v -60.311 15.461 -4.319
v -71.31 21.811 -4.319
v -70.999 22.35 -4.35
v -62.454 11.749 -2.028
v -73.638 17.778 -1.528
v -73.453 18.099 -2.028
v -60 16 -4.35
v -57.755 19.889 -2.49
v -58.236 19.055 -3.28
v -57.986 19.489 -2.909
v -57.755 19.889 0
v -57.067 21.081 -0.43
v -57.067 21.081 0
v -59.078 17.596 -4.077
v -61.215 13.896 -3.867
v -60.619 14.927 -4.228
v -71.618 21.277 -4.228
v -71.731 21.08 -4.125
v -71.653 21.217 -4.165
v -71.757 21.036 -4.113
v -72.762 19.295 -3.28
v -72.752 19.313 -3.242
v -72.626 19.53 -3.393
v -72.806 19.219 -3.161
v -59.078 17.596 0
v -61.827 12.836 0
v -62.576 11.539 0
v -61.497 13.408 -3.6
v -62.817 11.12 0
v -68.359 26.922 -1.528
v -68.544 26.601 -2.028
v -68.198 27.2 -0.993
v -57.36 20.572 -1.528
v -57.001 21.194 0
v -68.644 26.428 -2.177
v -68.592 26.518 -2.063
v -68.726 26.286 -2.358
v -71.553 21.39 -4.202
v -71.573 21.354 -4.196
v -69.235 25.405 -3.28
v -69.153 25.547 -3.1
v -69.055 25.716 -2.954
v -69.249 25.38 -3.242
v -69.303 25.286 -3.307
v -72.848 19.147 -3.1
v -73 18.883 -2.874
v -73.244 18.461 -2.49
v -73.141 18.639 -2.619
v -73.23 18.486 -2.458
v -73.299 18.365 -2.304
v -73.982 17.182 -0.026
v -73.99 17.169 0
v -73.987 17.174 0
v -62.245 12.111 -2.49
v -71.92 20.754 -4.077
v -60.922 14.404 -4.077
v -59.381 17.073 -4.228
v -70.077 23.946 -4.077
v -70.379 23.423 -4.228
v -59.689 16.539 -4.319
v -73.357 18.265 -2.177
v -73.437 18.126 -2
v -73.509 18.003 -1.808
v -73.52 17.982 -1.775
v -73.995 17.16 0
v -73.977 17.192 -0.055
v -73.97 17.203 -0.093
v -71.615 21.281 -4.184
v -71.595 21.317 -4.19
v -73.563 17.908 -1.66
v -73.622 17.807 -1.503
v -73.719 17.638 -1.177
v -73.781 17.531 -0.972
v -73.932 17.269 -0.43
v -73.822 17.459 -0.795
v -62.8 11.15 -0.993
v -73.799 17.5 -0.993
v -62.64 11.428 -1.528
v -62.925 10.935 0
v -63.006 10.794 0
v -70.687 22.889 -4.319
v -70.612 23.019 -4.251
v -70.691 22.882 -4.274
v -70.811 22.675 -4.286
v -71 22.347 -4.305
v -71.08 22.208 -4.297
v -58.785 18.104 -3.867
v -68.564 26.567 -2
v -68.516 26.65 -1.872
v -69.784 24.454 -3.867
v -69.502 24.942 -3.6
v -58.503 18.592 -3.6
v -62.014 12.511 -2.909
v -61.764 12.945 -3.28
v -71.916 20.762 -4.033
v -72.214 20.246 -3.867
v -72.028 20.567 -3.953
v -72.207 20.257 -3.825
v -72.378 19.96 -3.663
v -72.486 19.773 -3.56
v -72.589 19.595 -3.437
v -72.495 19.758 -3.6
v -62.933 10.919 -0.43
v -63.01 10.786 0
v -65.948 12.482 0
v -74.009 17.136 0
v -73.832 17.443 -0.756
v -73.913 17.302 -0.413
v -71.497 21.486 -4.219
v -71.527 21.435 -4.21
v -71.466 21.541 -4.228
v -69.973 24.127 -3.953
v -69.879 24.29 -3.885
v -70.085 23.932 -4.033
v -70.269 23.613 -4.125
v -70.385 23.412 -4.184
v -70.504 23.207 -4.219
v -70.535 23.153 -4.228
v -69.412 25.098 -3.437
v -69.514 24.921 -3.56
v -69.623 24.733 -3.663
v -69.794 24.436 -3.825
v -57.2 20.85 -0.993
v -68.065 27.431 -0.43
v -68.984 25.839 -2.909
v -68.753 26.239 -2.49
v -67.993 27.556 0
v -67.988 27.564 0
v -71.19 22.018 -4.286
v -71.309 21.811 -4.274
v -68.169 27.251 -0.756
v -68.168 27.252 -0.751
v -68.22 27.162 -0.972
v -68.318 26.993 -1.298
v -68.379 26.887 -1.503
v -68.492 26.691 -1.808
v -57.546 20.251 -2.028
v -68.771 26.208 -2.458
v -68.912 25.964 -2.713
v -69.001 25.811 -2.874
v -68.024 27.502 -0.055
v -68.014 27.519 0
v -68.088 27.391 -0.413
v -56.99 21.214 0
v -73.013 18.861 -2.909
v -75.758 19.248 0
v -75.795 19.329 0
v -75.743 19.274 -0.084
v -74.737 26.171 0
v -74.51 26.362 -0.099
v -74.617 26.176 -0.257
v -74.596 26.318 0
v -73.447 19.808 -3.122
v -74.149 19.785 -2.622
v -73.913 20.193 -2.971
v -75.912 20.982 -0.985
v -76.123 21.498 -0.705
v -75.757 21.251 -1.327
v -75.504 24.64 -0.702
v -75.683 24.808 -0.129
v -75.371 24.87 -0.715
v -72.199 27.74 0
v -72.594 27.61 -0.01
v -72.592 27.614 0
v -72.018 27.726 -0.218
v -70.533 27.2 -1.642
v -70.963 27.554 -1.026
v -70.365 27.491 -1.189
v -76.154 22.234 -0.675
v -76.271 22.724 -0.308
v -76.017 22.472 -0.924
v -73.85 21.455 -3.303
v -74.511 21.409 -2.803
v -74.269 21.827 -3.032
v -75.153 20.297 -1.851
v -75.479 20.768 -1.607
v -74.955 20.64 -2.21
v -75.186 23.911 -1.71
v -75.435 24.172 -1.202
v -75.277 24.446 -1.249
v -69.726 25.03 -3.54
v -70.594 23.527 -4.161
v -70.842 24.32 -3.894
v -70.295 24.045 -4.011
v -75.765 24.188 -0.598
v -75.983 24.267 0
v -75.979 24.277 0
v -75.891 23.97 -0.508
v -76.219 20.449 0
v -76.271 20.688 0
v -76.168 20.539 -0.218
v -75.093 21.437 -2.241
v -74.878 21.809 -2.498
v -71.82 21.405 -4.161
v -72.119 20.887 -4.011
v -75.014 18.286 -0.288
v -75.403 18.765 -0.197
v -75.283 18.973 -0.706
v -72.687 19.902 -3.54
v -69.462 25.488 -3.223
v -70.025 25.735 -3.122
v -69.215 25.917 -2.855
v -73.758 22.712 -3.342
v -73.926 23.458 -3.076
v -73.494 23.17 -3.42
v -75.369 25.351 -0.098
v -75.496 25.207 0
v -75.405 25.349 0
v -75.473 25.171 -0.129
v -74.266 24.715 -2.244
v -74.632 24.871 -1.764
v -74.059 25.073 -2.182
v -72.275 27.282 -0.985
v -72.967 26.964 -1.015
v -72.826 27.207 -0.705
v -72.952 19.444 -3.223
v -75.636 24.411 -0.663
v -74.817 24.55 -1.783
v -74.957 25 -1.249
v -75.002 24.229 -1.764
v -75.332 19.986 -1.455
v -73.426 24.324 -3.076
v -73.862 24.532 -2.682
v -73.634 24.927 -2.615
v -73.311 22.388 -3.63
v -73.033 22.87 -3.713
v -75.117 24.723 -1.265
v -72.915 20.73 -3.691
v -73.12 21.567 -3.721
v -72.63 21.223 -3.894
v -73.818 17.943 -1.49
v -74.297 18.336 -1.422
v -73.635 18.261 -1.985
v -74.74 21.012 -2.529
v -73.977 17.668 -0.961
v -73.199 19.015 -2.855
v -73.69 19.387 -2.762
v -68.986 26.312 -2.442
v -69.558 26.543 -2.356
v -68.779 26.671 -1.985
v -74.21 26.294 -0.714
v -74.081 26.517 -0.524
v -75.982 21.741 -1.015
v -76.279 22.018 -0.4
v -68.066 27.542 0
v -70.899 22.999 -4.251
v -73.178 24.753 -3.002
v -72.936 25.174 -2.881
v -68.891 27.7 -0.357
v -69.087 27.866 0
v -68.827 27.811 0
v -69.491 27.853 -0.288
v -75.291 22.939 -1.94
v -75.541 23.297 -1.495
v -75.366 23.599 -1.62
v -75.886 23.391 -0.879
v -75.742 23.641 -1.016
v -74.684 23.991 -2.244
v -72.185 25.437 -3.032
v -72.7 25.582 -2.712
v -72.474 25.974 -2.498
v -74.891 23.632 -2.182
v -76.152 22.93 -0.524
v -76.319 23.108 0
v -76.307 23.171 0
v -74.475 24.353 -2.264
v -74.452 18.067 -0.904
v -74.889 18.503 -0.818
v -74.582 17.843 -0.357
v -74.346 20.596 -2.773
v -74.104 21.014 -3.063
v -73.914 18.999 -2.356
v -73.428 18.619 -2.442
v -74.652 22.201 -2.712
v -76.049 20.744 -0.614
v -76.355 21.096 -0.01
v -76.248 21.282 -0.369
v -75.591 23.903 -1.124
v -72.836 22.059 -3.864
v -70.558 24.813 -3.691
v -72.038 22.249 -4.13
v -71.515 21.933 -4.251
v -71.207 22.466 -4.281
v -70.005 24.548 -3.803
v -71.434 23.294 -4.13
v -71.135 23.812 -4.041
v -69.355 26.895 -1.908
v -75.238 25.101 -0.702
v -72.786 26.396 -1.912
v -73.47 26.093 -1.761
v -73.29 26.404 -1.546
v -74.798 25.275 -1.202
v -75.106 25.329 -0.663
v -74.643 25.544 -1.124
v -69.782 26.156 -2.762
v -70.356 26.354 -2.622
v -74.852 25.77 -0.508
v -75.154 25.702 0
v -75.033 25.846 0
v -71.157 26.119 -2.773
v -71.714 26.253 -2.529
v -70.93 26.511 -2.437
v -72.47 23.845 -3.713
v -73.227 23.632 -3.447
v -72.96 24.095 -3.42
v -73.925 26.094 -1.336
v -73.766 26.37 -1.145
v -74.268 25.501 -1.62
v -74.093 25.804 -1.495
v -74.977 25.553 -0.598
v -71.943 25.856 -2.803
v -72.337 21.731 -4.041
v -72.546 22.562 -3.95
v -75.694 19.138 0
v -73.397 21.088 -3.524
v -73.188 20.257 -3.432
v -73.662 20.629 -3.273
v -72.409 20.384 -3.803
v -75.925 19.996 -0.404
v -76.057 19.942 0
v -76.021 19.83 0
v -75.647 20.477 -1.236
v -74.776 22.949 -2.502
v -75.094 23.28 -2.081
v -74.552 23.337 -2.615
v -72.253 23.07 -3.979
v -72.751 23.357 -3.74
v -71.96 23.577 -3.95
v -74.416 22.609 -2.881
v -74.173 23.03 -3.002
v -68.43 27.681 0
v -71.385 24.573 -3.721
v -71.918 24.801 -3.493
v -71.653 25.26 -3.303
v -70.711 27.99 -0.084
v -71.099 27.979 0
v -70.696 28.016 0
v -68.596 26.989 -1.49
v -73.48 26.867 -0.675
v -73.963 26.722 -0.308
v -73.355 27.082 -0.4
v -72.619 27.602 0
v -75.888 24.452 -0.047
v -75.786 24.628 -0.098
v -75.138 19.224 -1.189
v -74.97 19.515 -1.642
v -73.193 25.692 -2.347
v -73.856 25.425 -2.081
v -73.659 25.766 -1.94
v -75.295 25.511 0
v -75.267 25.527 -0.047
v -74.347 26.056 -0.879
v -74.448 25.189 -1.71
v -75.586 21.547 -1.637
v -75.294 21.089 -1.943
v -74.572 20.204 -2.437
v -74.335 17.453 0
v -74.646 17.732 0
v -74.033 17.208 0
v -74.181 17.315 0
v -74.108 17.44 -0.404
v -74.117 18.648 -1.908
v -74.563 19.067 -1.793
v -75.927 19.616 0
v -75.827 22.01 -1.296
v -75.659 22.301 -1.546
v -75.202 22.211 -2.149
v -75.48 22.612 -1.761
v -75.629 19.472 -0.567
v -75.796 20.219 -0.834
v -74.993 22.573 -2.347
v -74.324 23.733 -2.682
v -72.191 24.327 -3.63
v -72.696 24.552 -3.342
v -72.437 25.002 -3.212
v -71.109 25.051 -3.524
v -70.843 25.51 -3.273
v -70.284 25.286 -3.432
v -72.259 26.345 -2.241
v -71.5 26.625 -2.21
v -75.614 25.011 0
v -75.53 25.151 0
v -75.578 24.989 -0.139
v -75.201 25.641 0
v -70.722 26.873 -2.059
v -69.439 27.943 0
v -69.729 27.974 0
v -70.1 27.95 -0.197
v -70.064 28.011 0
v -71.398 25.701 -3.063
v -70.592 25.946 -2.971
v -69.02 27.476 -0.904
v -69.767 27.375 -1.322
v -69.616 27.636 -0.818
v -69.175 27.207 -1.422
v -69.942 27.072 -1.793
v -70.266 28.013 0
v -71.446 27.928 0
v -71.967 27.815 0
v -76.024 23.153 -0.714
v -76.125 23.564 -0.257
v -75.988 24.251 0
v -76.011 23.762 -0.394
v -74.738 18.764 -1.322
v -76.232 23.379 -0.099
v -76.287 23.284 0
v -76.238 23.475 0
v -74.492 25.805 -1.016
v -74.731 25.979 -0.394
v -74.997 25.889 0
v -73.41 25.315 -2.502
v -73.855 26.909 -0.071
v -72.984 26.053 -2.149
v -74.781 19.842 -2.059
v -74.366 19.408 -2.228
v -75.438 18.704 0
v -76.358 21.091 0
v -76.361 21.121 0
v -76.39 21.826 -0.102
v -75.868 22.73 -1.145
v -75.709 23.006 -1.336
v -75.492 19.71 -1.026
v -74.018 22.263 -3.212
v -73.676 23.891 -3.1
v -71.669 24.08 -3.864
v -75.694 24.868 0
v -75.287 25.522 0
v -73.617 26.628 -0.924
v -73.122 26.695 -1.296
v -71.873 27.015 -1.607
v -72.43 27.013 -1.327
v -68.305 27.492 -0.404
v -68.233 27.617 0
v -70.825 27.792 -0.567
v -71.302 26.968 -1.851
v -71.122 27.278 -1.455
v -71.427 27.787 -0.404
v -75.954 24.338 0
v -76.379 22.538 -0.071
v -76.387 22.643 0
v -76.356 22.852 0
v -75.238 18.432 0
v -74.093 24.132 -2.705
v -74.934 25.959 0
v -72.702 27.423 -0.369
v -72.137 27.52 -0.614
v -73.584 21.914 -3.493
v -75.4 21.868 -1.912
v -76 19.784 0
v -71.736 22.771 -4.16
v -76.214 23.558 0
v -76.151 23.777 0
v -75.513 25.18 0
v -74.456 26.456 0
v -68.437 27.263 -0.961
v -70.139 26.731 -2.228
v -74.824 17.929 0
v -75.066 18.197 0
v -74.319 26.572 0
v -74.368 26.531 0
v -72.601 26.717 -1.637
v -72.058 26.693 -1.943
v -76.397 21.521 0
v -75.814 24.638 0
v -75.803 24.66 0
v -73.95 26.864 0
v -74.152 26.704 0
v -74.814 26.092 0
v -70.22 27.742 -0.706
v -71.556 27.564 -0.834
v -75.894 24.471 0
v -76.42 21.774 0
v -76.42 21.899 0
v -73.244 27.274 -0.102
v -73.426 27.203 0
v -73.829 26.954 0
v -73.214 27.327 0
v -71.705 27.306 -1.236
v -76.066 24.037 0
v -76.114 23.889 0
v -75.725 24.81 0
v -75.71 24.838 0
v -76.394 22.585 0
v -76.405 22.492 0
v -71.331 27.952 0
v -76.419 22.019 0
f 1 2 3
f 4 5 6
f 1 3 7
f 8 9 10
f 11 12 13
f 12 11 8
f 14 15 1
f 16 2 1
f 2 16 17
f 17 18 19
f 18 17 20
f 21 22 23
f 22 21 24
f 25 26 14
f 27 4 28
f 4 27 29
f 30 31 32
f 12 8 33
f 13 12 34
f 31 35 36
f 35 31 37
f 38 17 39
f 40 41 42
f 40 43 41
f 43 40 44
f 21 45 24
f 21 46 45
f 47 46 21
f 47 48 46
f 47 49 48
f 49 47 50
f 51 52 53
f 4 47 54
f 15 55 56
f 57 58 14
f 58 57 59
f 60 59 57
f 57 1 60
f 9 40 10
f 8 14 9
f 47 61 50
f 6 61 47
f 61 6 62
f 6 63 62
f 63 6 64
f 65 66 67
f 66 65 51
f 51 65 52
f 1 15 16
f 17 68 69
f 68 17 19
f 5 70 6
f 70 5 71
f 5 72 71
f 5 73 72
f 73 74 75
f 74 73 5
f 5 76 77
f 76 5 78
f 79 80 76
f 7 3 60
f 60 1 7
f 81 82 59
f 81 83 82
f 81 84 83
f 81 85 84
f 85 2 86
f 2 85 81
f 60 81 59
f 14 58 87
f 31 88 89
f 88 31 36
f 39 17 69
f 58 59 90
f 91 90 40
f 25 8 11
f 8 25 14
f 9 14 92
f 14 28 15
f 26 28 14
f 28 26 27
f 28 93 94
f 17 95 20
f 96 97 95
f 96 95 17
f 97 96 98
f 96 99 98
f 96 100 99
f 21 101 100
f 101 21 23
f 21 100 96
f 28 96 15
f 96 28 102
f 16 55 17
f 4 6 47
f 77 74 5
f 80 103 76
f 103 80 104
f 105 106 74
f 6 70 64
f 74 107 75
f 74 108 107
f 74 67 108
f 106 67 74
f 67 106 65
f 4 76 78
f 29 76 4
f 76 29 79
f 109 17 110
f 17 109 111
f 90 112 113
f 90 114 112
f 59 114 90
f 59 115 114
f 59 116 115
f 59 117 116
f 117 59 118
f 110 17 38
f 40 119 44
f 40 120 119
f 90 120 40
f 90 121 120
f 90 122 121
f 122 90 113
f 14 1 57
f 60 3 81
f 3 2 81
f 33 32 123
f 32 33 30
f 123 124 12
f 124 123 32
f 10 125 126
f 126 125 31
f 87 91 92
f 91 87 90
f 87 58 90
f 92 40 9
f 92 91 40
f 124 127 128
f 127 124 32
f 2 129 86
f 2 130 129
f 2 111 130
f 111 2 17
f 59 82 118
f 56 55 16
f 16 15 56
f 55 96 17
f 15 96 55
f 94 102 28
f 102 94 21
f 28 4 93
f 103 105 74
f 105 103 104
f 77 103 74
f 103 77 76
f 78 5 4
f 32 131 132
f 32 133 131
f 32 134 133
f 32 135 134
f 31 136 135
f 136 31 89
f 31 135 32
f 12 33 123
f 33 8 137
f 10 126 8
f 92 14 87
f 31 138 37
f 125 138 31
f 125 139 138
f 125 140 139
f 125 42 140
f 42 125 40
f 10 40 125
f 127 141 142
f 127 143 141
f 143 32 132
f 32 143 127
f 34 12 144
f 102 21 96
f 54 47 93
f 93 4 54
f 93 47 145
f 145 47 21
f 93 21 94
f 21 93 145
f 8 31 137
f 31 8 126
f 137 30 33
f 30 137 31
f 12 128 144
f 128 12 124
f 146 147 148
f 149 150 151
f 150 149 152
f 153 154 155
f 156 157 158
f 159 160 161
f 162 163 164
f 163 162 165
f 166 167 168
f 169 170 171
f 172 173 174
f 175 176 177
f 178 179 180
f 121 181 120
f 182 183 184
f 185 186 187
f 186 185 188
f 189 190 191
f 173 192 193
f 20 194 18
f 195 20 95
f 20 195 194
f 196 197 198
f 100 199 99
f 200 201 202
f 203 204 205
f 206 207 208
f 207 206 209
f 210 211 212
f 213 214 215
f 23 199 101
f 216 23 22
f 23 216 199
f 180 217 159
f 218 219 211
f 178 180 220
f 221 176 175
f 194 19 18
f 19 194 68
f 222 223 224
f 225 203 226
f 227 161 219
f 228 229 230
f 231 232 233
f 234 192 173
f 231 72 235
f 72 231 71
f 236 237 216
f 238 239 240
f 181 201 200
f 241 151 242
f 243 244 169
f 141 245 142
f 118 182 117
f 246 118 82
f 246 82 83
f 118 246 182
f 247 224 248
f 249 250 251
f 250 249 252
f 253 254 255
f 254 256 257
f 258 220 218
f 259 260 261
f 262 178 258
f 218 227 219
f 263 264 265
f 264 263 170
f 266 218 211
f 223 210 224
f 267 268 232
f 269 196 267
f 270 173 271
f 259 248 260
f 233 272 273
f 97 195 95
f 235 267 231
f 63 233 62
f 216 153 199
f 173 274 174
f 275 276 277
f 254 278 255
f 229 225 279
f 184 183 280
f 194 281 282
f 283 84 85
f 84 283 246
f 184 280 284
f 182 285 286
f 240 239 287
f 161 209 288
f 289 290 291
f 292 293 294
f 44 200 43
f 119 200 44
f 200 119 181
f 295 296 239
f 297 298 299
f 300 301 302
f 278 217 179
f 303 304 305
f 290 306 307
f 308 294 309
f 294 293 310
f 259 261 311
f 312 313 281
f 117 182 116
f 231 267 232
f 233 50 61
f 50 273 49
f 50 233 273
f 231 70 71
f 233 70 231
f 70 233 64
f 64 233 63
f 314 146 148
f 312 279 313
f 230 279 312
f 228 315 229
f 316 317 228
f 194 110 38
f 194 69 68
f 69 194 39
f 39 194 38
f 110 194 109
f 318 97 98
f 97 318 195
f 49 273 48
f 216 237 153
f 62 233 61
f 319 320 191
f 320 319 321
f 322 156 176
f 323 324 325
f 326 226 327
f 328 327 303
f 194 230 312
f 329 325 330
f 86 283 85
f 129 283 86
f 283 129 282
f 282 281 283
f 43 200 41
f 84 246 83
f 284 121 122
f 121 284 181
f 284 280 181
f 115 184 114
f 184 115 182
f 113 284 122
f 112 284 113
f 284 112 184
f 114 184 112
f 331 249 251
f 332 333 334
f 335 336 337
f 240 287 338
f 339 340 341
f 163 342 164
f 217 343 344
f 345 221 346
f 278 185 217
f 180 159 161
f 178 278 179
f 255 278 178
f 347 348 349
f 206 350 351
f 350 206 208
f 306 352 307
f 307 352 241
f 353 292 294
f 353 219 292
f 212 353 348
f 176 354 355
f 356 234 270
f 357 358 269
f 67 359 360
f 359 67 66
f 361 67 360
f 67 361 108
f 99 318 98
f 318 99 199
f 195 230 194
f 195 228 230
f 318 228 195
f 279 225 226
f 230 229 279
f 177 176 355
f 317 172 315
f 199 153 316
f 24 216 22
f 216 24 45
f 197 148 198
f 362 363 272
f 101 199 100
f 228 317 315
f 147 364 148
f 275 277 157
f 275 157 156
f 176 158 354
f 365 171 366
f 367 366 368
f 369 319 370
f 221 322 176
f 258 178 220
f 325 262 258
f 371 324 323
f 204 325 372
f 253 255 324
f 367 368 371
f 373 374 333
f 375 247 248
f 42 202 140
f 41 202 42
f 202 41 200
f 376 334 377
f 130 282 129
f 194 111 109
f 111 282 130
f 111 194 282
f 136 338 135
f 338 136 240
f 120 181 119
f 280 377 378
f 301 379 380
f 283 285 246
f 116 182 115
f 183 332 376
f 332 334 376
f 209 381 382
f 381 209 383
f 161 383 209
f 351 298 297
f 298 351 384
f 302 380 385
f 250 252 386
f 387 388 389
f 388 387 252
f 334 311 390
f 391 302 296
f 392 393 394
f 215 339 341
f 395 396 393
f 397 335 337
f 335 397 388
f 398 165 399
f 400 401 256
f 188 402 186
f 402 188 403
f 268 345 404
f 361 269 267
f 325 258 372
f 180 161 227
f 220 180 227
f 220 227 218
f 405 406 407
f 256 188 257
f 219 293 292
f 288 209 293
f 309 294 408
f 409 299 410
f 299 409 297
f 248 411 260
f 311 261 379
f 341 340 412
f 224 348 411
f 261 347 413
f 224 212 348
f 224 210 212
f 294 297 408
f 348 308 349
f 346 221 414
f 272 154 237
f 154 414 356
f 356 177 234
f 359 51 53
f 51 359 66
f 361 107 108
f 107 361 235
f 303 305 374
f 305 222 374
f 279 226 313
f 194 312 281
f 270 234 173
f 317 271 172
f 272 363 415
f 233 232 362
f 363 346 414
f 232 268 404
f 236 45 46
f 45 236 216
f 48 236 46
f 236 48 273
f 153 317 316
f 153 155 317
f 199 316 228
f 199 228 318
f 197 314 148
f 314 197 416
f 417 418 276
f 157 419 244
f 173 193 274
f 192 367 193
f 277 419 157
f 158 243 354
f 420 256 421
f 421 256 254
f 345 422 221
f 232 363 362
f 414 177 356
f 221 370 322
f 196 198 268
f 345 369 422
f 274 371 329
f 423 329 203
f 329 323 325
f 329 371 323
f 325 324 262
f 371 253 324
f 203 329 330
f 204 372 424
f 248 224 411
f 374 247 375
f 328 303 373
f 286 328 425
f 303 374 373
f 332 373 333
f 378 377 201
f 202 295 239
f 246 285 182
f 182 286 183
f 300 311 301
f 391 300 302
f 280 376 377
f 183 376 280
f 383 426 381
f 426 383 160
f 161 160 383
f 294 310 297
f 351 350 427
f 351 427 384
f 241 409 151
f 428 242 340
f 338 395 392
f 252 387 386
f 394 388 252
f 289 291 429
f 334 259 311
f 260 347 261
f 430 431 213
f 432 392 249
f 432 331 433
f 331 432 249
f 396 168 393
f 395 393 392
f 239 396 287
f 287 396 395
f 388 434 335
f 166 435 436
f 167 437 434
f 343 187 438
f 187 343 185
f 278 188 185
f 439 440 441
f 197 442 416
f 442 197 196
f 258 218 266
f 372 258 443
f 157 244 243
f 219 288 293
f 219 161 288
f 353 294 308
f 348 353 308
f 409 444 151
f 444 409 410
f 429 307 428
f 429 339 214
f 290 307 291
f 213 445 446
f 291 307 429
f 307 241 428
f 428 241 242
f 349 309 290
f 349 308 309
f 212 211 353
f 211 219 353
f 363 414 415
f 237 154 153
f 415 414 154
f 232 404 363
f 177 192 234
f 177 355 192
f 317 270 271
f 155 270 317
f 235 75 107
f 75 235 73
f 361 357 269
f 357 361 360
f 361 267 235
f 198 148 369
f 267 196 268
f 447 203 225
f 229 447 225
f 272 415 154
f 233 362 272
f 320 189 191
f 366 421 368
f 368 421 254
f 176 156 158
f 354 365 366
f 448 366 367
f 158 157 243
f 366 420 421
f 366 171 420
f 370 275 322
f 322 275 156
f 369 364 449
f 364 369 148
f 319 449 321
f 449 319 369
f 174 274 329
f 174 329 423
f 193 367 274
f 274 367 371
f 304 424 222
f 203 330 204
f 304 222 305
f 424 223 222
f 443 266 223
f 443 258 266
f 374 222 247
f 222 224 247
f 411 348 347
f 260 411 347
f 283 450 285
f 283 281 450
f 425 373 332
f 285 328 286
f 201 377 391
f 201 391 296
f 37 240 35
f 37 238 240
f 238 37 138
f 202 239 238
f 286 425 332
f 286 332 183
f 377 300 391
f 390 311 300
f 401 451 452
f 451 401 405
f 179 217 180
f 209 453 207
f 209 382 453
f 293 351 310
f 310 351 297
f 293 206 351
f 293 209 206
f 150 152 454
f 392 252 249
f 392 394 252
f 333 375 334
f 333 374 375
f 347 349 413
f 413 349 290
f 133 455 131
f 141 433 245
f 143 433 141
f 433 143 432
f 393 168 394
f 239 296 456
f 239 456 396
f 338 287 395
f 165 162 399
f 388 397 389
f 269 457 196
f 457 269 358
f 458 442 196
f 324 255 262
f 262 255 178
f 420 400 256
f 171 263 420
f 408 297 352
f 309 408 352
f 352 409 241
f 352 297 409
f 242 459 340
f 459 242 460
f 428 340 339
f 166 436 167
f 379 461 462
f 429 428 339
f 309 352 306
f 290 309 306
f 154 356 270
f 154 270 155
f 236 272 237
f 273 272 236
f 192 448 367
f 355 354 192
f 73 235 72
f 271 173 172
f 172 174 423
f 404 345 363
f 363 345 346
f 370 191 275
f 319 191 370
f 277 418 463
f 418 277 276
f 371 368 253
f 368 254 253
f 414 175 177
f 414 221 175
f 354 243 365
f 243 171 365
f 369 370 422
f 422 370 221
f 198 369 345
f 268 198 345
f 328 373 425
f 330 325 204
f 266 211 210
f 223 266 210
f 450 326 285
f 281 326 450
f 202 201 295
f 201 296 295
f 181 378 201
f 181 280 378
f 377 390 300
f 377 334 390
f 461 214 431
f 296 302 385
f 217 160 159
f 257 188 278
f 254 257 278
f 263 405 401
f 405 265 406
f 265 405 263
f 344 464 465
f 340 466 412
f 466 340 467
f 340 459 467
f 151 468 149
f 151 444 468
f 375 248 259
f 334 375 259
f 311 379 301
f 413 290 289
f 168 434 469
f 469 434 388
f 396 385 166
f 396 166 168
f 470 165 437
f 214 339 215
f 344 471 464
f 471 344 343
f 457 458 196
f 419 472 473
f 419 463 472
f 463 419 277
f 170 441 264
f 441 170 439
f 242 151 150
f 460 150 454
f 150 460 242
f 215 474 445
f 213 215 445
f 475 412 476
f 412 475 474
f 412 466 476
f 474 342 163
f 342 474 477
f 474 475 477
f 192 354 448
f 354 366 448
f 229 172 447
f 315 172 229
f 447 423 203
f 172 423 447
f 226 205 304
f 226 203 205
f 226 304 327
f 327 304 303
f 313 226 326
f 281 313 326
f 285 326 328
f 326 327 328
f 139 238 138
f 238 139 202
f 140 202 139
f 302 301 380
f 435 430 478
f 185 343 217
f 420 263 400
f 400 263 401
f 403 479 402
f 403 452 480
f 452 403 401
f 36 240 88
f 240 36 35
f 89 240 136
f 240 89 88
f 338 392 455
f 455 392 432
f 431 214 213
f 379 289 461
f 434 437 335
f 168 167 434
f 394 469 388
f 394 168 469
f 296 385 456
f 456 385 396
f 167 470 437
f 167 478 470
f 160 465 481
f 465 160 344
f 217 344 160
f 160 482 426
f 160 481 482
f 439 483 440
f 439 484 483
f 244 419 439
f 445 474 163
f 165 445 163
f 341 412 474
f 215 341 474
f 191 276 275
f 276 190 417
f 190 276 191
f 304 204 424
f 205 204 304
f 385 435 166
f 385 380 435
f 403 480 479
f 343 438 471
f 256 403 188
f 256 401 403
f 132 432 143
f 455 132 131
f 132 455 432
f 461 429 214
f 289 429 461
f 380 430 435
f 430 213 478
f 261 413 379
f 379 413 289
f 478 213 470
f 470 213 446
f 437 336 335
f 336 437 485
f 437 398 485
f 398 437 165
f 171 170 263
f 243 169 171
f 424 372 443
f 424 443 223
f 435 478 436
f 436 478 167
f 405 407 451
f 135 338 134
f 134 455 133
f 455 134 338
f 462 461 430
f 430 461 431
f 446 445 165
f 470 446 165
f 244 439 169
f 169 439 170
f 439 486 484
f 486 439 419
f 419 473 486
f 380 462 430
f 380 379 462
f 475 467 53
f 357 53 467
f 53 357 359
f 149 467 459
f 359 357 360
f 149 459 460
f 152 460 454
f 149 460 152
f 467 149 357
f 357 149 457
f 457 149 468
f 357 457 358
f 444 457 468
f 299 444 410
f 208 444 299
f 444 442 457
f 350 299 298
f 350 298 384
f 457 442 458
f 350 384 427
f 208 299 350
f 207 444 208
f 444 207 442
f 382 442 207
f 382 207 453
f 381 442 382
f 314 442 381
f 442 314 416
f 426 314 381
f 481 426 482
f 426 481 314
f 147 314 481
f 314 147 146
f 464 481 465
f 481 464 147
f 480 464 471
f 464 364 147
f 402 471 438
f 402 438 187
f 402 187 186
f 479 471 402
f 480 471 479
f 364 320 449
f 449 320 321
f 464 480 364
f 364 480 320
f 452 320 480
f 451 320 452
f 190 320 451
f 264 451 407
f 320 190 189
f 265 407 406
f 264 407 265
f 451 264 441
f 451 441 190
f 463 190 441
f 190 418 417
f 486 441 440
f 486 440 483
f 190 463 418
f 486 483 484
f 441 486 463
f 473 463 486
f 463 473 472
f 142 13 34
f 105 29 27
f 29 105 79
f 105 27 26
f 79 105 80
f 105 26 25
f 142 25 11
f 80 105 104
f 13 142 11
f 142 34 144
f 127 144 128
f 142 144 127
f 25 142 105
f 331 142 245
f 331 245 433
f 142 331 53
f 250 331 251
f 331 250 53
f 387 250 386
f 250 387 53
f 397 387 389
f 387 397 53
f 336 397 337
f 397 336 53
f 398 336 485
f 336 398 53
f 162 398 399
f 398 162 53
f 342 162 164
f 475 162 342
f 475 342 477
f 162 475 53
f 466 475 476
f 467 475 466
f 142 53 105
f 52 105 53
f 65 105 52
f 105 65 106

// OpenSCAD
$fn=64;

difference(){
union(){
translate([-60,16,2])
  rotate([0,90,150])
    cylinder(12.7,d=12.7,d=12.7);
translate([-70.4,22,2])
  rotate([0,90,150])
    sphere(d=12.7);
}
translate([-80,5,0])
  //rotate([0,90,150])
    cube([25,25,15]);
}

    
